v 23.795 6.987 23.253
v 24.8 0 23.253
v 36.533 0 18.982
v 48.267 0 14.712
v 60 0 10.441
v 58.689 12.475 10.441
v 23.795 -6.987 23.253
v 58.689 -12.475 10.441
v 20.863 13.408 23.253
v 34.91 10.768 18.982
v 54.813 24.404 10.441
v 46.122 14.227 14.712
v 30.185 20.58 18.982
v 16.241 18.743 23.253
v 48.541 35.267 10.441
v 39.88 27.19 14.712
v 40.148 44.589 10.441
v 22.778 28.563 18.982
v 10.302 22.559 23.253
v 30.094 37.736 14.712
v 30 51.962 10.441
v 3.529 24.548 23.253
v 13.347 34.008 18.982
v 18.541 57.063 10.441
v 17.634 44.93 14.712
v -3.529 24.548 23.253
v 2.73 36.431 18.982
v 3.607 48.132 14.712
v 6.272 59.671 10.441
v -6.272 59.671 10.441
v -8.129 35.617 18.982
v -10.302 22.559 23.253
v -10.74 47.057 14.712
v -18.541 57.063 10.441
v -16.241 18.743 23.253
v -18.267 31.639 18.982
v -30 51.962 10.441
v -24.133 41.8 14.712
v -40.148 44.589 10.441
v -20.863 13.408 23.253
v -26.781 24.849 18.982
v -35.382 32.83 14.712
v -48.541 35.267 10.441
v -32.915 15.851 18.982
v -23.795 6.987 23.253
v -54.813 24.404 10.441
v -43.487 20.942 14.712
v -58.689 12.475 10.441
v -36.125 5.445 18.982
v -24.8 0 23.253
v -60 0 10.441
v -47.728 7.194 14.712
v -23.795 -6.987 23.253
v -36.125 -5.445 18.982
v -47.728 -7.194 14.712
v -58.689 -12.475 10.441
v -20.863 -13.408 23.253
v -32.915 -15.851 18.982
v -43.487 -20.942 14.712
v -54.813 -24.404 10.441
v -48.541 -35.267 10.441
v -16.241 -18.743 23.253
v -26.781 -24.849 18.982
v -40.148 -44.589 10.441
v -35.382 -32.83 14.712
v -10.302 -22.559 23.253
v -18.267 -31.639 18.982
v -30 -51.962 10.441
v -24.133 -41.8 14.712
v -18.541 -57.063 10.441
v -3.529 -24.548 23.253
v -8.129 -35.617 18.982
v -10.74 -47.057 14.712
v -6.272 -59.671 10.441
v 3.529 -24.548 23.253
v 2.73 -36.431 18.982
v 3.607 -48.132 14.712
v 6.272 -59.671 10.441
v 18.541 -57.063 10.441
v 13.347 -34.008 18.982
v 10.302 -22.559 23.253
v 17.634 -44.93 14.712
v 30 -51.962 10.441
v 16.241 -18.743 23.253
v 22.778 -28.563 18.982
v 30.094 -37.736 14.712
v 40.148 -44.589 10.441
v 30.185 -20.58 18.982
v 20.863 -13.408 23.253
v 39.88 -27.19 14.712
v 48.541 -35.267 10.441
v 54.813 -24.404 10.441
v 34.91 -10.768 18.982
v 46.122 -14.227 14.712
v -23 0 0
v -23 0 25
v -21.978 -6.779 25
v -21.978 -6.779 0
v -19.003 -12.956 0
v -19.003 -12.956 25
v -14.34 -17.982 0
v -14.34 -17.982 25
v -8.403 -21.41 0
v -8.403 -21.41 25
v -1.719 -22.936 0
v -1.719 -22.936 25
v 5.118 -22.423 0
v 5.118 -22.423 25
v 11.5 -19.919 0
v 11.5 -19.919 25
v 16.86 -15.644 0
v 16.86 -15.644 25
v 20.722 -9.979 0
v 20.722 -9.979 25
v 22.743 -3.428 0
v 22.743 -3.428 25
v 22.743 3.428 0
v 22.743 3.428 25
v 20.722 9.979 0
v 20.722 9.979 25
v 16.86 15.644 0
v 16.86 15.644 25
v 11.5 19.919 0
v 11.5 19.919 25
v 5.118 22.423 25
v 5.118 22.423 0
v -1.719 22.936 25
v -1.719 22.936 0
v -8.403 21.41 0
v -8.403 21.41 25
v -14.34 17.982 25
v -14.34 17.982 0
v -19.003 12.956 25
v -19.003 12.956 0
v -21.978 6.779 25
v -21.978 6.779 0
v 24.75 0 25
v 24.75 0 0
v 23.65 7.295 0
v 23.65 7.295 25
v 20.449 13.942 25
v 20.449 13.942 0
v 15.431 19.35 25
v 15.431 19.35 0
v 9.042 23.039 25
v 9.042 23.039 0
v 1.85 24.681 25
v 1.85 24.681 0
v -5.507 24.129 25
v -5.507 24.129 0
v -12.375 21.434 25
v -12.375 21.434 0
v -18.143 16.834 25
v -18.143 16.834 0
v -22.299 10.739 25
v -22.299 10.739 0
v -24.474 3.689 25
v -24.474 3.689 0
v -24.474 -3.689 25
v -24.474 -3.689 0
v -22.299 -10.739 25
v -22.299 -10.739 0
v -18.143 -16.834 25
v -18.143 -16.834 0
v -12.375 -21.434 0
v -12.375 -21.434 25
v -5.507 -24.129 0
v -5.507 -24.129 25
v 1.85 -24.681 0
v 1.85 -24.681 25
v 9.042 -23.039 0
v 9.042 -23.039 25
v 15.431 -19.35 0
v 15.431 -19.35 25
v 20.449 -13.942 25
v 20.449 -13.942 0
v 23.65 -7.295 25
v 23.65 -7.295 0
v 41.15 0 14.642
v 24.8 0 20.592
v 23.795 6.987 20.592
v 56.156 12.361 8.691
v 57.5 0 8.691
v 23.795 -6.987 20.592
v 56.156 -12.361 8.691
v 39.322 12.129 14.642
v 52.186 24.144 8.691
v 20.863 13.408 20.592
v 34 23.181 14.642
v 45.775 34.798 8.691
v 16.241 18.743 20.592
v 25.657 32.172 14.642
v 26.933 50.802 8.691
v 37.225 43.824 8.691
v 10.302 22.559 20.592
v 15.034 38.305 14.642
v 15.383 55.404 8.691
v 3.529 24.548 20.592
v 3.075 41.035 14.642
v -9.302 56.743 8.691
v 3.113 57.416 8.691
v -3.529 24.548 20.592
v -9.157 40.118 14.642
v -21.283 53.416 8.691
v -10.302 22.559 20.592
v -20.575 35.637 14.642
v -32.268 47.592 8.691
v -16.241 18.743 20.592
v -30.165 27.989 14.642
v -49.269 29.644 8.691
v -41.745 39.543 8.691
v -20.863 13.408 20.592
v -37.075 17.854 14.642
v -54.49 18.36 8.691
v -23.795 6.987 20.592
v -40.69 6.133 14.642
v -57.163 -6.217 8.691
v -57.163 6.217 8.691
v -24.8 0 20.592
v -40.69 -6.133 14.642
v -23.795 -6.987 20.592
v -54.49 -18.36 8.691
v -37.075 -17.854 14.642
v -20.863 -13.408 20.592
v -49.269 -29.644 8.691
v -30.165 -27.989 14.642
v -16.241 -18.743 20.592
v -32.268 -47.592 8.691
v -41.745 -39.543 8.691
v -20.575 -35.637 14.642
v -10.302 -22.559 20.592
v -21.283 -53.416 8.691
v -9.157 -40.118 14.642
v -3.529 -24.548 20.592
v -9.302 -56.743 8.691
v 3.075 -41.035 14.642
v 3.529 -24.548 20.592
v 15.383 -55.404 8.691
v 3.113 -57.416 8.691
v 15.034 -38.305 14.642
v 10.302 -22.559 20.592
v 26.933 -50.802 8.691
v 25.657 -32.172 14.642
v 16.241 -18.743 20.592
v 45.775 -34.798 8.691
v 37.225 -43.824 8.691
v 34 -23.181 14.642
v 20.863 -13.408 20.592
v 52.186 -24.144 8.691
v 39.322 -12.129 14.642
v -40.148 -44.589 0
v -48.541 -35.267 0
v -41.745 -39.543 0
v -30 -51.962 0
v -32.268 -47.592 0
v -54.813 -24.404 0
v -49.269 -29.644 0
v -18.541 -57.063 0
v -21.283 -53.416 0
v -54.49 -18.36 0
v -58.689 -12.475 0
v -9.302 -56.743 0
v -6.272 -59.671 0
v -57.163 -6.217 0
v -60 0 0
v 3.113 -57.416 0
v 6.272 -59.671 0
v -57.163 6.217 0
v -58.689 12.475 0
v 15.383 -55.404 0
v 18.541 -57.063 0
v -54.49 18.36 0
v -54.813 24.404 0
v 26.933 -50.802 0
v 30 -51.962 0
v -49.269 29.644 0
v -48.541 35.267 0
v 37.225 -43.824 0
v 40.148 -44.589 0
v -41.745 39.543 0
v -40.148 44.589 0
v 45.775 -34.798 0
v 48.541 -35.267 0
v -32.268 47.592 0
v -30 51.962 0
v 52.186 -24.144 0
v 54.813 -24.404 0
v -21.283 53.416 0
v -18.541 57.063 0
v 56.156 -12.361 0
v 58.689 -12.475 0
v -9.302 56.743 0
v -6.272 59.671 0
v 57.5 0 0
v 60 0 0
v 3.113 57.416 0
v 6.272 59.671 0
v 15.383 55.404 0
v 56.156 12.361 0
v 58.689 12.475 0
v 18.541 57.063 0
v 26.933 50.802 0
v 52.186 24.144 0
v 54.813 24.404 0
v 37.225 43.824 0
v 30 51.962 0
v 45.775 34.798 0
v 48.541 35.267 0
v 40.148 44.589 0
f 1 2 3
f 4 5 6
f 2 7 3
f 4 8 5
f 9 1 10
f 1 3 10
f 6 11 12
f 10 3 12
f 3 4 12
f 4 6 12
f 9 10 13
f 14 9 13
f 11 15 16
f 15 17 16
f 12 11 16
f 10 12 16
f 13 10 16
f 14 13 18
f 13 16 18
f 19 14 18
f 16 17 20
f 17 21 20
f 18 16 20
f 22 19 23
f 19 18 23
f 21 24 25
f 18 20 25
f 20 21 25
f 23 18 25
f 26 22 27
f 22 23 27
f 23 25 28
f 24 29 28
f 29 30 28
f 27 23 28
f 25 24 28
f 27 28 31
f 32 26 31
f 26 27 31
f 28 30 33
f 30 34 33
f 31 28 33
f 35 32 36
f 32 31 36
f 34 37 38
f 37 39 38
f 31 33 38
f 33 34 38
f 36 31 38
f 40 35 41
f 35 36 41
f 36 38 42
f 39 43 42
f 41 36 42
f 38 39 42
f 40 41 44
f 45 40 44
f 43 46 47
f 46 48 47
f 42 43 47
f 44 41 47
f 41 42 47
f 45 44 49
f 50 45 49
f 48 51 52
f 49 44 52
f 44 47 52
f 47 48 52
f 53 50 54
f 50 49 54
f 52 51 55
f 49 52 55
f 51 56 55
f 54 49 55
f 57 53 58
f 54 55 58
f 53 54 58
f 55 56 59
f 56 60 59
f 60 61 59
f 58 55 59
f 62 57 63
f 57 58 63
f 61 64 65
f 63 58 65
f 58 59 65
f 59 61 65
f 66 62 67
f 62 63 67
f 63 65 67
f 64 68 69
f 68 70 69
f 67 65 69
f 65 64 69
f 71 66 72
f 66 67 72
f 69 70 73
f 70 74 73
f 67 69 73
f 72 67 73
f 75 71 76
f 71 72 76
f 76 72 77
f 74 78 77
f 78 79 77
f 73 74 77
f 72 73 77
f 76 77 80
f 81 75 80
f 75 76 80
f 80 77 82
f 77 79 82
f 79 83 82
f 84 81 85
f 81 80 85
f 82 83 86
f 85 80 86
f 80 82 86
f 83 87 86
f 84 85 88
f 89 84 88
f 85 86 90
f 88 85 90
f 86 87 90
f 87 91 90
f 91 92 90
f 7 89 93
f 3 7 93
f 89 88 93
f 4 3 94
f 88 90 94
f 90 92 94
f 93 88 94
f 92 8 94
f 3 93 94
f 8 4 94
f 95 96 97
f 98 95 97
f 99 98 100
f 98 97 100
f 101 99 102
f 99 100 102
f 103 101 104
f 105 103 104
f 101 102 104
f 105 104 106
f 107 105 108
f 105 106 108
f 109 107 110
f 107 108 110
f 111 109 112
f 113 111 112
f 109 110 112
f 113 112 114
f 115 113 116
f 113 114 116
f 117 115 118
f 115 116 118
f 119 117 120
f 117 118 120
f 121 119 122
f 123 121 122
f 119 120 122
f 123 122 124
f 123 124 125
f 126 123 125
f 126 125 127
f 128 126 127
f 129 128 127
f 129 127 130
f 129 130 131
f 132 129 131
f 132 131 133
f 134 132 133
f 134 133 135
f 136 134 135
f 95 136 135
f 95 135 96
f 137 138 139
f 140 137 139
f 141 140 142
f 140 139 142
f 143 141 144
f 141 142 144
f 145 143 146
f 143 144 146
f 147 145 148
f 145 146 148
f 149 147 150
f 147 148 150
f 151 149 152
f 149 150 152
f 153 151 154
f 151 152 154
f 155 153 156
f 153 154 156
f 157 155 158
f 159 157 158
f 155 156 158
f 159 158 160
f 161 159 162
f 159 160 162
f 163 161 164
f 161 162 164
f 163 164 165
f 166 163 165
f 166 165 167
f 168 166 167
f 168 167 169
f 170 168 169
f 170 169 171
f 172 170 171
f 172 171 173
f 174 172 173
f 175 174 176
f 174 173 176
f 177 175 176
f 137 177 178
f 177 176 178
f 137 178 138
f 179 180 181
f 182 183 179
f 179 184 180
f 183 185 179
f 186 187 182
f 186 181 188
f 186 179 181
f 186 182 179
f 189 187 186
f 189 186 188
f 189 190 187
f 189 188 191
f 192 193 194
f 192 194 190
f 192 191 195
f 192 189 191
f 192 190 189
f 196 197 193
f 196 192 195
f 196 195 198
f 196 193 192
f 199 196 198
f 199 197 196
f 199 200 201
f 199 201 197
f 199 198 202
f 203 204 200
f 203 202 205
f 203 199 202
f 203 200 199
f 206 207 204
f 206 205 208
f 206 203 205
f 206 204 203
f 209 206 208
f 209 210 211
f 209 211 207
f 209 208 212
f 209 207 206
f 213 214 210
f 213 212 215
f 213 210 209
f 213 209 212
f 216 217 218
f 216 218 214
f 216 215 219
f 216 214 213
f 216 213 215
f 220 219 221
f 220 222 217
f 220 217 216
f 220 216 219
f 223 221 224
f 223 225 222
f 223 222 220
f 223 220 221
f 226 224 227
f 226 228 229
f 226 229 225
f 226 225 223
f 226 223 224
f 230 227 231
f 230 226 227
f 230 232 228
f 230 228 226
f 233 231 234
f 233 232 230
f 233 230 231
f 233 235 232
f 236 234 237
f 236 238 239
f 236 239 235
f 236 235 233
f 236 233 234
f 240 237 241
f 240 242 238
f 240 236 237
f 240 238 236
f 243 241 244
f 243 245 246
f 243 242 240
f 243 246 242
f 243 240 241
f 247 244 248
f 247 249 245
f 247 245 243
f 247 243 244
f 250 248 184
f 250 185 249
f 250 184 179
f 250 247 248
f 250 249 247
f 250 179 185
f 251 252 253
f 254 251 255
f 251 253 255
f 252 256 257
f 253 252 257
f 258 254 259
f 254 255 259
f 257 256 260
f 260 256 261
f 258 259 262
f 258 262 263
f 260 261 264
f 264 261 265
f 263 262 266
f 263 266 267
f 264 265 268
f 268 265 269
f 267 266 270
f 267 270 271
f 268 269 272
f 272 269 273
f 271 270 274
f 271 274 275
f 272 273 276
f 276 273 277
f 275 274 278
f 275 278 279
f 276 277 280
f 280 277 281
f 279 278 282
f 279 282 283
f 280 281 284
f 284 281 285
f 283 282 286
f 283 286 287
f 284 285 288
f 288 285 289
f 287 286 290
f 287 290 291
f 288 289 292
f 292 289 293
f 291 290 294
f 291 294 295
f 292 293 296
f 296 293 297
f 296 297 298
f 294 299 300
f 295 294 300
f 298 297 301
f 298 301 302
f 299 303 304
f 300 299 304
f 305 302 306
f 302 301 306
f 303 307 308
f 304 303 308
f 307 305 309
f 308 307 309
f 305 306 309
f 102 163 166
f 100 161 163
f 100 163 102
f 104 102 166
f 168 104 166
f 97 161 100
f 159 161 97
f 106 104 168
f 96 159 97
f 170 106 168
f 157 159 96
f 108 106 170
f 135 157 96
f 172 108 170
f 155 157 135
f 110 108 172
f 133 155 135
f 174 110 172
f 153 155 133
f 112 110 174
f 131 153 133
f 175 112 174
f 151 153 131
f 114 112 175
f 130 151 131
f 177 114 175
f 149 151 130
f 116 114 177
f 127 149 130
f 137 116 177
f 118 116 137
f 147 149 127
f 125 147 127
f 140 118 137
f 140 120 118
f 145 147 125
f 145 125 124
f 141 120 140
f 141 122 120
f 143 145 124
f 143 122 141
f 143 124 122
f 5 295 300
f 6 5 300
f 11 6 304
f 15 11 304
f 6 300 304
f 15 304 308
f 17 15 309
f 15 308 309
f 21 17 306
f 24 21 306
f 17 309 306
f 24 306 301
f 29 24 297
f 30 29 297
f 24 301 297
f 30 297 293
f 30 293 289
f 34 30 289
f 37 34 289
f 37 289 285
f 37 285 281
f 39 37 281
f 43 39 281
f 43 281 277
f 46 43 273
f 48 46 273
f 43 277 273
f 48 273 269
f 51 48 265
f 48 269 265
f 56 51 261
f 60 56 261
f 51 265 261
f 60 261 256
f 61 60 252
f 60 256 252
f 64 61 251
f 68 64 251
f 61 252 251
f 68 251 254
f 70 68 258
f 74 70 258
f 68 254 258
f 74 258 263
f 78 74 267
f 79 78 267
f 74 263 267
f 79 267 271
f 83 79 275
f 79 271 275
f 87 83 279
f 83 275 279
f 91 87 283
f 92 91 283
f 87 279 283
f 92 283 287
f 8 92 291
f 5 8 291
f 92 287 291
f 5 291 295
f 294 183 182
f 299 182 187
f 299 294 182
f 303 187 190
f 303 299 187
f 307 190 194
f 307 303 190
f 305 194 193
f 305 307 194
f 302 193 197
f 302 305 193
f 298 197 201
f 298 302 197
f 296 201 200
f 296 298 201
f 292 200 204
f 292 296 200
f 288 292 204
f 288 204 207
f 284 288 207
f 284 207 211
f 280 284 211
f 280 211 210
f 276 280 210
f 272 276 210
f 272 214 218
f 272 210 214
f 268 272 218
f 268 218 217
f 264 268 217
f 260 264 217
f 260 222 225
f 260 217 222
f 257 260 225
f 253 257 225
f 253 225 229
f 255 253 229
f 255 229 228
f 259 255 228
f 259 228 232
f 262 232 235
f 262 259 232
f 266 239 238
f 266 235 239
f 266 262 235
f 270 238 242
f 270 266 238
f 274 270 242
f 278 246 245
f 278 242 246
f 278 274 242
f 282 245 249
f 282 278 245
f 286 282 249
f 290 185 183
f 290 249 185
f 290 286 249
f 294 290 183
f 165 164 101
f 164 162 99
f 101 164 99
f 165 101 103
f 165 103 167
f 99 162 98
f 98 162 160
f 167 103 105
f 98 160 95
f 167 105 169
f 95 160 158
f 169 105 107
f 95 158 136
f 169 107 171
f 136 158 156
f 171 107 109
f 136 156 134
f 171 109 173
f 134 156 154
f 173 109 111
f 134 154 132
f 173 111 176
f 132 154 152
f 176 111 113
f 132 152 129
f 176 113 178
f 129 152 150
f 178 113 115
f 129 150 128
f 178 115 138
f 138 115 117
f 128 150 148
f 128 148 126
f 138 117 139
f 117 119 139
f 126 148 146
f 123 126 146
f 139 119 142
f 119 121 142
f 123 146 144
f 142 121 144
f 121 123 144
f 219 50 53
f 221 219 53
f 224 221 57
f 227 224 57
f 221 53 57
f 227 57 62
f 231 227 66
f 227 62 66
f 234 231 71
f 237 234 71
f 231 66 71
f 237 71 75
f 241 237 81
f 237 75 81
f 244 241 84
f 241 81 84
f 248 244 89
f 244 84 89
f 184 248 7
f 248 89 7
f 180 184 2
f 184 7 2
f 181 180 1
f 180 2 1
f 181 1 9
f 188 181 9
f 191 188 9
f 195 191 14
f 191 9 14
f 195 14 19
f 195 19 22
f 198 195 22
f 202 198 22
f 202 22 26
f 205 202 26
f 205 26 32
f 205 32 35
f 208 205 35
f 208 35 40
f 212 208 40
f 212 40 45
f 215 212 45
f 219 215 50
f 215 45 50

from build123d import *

# Parameters (mm, degrees)
F0_R     = 60
F1_DEPTH = 25
F2_SIZE2 = 14.5588093706
F2_SIZE  = 40
F3_T     = -2.5
F4_D     = 49.6
F5_R     = 24.75
F6_DEPTH = 25
F7_D     = 46


with BuildPart() as f1:
    # F0 (on Top) → F1 (new body)
    with BuildSketch(Plane.XY):
        Circle(F0_R)
    extrude(amount=F1_DEPTH)

    # F2
    f2_edges = [f1.edges().sort_by_distance(p)[0] for p in [
        (-60, 0, 25),
    ]]
    f2_side = f1.faces().sort_by_distance((0, 0, 25))[0]
    chamfer(f2_edges, length=F2_SIZE, length2=F2_SIZE2, reference=f2_side)

    # F3
    f3_openings = [f1.faces().sort_by_distance(p)[0] for p in [
        (0, 0, 0),
    ]]
    offset(amount=F3_T, openings=f3_openings)

    # F4 (through all)
    with Locations(Plane(origin=(0, 0, 0), x_dir=(1, 0, 0), z_dir=(0, 0, -1))):
        with Locations((0, 0)):
            Hole(F4_D / 2)


with BuildPart() as f6:
    # F5 (on Top) → F6 (new body)
    with BuildSketch(Plane.XY):
        Circle(F5_R)
    extrude(amount=F6_DEPTH)

    # F7 (through all)
    with Locations(Plane(origin=(0, 0, 0), x_dir=(1, 0, 0), z_dir=(0, 0, -1))):
        with Locations((0, 0)):
            Hole(F7_D / 2)


solid = Compound([f1.part, f6.part])
